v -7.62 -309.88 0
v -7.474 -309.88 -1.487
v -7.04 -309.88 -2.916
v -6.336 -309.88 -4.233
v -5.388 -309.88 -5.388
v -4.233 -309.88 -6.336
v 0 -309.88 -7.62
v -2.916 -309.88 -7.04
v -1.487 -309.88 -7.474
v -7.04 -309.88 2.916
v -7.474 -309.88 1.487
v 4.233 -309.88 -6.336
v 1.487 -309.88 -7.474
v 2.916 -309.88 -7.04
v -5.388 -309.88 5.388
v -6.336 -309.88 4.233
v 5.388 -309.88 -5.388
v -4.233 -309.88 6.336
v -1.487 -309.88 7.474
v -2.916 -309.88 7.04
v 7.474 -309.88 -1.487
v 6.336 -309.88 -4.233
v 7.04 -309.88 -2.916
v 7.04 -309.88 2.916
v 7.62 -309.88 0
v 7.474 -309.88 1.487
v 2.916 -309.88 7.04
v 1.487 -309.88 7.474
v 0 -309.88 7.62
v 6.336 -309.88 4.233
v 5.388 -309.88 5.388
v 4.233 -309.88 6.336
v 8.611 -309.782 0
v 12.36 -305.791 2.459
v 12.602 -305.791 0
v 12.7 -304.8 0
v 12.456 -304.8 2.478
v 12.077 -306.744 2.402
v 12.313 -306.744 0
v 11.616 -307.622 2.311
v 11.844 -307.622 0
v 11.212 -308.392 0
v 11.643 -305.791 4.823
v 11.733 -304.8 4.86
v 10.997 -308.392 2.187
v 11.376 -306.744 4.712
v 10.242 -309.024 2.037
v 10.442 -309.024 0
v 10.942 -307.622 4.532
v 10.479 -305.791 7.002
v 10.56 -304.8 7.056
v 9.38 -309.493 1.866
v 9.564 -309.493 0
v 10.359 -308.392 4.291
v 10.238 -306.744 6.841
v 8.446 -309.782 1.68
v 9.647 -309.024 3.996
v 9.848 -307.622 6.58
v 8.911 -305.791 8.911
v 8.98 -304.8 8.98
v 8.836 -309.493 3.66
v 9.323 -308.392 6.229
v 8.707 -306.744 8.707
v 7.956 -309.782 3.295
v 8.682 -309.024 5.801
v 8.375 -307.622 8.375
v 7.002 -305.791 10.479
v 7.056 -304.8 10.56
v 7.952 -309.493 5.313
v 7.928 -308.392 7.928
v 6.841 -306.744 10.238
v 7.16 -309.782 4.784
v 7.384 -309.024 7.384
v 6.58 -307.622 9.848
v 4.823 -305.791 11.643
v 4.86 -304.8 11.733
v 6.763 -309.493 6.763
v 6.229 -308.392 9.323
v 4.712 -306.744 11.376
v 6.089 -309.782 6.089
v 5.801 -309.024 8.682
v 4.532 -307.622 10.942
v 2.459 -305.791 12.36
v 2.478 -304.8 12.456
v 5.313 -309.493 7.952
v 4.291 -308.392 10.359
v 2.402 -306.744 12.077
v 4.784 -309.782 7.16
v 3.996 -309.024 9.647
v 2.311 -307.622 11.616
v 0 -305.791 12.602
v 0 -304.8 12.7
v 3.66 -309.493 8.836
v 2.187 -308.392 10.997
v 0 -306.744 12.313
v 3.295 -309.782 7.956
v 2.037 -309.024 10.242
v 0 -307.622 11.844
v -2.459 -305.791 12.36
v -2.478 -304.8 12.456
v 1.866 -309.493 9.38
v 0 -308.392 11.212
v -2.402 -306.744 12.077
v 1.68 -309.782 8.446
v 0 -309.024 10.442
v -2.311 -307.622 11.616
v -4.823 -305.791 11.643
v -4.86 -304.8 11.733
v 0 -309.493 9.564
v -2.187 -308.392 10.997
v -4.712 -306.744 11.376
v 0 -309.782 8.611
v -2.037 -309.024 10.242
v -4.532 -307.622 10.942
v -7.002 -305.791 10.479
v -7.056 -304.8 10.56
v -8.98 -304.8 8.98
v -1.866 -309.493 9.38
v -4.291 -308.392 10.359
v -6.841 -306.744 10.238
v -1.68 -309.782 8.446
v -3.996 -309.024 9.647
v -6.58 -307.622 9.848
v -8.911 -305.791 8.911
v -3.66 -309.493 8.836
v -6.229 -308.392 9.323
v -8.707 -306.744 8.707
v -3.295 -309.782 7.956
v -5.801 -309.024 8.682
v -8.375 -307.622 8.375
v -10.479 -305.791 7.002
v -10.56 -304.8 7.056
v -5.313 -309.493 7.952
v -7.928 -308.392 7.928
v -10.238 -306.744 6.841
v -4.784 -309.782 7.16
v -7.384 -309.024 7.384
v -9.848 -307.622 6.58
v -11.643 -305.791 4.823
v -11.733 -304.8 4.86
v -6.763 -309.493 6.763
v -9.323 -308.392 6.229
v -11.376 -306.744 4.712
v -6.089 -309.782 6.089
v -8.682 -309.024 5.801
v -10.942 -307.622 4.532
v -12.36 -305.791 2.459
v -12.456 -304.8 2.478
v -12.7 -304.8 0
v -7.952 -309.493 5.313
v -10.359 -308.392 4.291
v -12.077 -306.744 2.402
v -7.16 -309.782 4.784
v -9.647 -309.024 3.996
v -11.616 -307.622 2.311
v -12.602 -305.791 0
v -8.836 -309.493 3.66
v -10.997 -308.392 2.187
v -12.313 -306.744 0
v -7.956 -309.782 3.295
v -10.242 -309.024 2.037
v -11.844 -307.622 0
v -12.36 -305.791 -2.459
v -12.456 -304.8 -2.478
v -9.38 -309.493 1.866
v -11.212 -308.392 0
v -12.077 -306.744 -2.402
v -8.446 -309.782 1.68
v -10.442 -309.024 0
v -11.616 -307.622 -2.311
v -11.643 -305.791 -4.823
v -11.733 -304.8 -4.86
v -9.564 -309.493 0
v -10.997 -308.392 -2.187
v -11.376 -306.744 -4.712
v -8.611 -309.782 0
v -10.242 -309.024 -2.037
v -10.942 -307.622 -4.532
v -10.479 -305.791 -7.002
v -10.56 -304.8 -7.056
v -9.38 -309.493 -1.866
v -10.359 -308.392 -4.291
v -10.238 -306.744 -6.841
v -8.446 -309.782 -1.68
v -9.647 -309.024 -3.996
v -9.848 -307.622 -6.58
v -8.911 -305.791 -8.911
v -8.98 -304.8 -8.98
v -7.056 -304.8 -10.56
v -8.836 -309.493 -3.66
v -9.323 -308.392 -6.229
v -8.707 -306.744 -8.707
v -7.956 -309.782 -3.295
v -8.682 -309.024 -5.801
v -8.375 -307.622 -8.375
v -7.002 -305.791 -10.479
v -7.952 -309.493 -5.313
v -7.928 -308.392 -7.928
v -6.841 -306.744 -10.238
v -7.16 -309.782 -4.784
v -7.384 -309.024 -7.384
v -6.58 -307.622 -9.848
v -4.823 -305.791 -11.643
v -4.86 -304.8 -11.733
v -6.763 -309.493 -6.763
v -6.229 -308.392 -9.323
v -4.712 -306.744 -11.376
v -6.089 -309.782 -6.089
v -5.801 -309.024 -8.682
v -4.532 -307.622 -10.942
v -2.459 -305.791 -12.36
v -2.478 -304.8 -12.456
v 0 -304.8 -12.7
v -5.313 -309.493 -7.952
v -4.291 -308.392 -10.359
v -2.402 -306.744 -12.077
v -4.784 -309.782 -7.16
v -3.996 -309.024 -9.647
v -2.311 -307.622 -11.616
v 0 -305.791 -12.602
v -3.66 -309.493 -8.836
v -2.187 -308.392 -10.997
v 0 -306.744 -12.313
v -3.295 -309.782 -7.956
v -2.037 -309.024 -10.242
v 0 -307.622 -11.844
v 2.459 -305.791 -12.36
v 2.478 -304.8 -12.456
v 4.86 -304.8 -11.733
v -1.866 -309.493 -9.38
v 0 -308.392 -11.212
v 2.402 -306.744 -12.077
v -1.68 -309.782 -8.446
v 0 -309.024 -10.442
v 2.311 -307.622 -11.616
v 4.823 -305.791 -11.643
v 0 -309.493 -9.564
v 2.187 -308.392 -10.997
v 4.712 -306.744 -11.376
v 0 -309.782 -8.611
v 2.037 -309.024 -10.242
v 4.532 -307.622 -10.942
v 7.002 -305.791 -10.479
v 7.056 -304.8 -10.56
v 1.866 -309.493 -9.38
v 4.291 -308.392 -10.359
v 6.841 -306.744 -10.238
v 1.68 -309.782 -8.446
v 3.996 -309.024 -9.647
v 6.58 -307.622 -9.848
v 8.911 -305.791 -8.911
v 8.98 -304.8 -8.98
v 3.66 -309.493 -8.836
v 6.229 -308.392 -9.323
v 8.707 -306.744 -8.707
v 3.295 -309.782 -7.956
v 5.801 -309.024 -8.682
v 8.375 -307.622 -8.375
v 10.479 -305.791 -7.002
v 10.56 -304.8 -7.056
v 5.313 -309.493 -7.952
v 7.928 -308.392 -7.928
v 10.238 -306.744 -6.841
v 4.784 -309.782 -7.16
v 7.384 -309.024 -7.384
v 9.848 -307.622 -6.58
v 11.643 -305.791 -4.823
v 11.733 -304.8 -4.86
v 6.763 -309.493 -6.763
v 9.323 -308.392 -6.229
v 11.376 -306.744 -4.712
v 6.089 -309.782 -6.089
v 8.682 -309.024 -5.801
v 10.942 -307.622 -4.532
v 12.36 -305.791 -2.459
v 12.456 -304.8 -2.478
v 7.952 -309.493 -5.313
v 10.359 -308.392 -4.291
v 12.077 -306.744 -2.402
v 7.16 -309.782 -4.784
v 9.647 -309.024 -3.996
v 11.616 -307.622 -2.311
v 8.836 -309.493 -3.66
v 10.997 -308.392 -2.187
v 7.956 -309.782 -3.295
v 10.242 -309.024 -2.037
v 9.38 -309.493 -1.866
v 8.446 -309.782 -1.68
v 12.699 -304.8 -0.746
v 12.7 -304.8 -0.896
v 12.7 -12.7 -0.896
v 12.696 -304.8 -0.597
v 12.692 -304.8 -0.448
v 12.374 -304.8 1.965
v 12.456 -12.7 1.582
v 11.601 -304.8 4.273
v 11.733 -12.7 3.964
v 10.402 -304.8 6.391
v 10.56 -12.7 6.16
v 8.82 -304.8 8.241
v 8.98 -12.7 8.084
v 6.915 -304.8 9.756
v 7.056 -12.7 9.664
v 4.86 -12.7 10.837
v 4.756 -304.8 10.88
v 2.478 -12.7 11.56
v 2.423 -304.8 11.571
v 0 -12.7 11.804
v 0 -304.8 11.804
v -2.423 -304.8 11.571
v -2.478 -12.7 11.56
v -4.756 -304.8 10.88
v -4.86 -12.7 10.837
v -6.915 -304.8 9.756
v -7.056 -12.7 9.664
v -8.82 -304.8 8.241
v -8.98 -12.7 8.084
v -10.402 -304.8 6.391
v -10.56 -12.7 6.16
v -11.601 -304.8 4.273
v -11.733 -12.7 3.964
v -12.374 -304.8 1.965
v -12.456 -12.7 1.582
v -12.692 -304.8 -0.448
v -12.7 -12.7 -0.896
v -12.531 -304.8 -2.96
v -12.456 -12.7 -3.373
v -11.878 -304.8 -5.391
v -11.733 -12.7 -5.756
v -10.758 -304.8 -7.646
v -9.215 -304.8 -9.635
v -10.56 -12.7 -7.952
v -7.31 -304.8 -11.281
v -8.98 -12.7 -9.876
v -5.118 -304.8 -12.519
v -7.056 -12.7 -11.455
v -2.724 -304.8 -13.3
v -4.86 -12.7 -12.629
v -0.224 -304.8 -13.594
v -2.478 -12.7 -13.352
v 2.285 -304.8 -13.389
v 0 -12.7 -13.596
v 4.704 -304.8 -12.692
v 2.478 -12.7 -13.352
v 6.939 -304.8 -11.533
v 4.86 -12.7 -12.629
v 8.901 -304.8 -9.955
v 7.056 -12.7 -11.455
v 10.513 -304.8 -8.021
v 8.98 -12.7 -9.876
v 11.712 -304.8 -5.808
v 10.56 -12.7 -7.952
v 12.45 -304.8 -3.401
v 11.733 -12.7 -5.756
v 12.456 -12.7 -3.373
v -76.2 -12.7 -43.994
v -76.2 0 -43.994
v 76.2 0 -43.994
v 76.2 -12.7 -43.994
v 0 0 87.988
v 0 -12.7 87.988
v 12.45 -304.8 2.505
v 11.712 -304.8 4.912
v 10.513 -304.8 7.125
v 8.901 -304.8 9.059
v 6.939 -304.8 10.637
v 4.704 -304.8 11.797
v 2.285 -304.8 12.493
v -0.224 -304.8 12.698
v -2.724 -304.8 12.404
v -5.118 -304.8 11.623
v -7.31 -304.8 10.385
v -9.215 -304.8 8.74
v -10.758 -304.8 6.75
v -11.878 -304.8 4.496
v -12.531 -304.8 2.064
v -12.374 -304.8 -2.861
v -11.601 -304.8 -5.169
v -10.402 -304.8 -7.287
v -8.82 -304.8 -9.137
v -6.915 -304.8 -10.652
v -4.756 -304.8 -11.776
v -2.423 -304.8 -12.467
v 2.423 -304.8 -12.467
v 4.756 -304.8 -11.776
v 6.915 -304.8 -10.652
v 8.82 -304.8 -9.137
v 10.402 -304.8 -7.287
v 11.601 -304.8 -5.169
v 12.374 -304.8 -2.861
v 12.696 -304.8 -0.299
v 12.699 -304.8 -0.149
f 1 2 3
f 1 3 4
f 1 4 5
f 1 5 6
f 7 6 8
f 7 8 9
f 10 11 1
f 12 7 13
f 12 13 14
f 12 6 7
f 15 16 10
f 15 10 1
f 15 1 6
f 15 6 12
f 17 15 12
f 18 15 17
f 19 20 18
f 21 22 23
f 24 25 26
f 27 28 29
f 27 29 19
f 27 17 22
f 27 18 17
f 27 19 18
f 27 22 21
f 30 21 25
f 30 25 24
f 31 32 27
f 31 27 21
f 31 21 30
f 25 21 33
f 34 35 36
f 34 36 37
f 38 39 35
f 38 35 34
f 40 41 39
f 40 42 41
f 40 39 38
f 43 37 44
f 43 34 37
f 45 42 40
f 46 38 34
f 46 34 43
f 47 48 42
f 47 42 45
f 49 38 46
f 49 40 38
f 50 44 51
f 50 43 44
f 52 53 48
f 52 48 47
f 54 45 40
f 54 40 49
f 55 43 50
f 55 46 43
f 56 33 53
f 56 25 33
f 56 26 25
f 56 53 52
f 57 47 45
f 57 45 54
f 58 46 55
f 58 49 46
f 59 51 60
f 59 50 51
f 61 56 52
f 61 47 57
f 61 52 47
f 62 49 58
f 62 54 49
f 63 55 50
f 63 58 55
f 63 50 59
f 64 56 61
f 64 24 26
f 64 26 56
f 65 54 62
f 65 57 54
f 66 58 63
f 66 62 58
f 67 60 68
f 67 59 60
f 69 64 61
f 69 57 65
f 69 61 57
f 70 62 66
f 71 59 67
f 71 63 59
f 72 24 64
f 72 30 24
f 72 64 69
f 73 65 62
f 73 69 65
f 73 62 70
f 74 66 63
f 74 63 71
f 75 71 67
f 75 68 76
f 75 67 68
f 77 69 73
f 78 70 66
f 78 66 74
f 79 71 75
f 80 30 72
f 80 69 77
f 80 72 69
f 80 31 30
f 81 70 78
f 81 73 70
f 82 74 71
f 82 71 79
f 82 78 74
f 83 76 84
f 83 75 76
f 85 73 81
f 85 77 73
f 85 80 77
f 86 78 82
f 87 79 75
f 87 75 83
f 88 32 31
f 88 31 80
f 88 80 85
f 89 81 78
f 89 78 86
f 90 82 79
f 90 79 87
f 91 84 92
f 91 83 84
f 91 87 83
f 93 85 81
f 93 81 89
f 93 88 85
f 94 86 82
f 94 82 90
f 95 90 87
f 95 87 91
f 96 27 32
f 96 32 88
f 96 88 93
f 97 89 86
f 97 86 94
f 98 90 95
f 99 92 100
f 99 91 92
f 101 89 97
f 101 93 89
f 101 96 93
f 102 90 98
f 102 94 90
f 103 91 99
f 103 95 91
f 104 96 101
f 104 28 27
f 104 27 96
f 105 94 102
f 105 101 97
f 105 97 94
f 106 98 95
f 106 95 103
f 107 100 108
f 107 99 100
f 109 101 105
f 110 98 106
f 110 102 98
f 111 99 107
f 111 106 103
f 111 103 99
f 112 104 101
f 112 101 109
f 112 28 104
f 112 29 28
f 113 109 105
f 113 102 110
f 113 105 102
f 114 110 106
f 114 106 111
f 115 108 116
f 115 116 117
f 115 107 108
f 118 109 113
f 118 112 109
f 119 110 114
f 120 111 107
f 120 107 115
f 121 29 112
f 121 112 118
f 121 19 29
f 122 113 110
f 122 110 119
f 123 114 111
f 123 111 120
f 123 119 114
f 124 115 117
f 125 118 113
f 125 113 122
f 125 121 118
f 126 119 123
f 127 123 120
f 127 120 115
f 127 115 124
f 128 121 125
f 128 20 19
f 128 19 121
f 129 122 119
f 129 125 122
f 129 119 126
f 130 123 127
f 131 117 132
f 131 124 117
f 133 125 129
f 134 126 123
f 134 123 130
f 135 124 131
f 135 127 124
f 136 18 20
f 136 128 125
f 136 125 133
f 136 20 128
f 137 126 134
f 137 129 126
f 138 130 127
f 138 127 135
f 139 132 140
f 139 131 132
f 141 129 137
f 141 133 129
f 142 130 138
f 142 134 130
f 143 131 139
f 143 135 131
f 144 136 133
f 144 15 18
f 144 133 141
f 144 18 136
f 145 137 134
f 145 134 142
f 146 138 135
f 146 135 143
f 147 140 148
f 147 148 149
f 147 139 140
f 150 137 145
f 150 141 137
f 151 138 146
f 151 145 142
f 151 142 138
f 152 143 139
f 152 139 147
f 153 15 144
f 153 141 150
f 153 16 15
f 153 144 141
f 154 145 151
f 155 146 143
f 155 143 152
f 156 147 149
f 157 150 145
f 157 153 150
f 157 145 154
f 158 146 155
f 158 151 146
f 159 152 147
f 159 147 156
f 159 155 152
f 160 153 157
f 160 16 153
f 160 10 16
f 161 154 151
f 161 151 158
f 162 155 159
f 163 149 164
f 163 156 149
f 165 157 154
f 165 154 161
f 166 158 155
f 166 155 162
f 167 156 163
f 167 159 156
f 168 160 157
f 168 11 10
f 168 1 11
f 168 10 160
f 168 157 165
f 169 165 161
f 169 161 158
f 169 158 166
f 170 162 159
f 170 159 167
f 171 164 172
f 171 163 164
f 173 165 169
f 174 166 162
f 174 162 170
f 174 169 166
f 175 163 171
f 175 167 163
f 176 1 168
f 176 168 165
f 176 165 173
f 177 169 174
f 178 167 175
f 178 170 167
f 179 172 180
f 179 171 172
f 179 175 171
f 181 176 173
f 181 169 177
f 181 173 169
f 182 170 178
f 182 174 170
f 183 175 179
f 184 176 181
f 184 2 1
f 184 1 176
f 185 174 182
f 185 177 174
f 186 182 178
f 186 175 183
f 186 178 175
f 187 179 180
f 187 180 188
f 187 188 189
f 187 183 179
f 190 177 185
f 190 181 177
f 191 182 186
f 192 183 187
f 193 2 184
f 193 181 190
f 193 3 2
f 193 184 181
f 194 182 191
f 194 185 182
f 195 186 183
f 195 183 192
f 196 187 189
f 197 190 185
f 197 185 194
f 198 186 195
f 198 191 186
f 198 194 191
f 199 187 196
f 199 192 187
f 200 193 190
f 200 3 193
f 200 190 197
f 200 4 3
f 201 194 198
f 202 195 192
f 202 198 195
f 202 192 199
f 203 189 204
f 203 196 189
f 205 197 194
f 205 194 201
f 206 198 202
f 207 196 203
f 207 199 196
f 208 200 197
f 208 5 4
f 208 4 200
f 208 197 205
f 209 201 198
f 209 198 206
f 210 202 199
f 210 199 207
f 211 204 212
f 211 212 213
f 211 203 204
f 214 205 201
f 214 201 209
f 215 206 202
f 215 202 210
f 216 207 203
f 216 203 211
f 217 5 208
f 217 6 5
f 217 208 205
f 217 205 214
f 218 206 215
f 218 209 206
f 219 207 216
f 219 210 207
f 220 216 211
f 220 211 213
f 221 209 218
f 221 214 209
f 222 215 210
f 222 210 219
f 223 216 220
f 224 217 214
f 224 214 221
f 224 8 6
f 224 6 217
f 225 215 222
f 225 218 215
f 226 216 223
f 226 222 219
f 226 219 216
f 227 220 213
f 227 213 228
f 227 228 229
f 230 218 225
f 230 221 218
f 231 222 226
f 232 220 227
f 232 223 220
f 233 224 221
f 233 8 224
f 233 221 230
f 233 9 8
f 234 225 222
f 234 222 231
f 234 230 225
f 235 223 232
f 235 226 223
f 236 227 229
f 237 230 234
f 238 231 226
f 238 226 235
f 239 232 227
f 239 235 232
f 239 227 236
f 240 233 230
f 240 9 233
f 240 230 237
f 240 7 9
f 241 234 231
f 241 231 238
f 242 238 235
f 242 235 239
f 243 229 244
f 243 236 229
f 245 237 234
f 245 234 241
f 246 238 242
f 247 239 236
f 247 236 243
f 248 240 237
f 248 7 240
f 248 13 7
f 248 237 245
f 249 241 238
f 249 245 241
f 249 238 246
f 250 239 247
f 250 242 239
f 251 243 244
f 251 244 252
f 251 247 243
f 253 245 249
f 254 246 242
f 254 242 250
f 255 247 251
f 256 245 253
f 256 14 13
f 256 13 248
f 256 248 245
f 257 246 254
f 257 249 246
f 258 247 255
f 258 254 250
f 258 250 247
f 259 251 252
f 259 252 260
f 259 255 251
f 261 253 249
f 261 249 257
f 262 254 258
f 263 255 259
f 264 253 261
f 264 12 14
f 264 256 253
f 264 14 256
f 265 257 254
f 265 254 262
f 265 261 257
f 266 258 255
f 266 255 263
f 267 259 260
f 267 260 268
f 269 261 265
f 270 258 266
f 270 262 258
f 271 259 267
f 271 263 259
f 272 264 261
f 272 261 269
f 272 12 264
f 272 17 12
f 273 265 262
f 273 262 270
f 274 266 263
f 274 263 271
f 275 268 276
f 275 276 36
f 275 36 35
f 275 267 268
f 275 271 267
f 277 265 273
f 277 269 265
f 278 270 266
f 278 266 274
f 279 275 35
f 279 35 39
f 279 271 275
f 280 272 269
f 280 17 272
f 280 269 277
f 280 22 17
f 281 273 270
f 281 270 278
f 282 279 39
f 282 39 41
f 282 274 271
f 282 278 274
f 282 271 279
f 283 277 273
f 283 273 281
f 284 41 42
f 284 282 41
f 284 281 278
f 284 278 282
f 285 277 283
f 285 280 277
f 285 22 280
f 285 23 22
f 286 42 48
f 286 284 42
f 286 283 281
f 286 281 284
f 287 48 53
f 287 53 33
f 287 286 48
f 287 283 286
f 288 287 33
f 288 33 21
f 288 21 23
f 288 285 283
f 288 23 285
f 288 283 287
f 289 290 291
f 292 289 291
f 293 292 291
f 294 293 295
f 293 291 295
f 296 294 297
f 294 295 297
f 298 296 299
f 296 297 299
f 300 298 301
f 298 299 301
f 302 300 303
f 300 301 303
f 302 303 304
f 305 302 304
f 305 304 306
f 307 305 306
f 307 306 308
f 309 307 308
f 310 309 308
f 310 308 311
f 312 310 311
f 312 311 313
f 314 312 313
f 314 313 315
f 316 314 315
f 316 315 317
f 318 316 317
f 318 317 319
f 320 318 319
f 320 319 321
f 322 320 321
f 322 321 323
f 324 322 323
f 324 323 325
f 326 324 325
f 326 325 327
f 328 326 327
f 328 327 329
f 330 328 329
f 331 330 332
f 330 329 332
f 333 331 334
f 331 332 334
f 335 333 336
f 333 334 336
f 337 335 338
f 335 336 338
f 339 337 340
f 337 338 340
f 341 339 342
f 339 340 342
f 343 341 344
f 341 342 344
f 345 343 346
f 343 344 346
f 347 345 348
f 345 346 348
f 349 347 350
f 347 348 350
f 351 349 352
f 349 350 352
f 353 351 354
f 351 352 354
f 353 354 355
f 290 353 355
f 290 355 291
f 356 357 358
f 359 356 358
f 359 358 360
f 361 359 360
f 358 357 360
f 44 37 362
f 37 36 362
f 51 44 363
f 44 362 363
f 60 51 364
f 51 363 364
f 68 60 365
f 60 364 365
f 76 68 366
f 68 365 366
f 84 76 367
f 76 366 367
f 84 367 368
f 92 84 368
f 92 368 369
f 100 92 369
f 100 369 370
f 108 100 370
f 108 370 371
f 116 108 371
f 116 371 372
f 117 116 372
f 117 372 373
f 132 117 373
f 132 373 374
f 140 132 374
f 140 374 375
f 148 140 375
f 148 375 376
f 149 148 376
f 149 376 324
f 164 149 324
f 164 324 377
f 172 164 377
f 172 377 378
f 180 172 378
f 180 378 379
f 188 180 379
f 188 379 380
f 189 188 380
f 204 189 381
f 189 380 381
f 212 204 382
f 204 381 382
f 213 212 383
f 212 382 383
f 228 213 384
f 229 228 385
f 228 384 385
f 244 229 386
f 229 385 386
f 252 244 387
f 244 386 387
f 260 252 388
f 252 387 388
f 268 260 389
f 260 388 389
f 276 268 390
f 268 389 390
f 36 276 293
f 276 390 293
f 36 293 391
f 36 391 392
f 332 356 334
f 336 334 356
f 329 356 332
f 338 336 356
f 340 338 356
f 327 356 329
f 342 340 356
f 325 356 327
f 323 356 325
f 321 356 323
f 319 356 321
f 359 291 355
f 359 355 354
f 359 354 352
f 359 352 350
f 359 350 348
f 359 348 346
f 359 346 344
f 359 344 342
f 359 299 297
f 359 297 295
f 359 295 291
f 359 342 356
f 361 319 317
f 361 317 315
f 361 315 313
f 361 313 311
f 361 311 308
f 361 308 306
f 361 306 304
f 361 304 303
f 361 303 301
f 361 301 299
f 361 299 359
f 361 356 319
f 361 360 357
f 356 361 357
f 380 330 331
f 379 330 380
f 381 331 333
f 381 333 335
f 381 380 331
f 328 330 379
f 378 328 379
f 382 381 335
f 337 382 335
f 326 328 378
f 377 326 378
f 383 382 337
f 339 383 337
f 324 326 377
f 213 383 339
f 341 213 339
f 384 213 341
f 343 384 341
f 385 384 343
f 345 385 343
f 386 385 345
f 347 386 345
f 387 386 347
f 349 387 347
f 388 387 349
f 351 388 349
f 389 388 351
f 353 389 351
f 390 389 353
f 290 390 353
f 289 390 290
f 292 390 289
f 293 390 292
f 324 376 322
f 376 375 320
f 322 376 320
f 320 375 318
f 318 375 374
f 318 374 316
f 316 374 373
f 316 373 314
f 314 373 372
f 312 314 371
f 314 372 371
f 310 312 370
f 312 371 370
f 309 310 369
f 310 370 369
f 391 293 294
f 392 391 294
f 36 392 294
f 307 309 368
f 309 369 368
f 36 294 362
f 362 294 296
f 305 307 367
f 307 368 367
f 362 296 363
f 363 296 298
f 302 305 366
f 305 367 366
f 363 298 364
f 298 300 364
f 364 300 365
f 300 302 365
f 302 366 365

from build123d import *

# Parameters (mm, degrees)
F1_DEPTH = 12.7
F2_R     = 12.7
F3_DEPTH = 304.8
F4_R     = 12.7
F5_DEPTH = 5.08
F6_R     = 5.07999


# Not quite as in the source:
# - a fillet or chamfer is up to 0.001 mm smaller than in the source, because OpenCascade refuses the exact size


with BuildPart() as f1:
    # F0 (on Front) → F1 (new body)
    with BuildSketch(Plane.XZ):
        Polygon((-76.2, -43.9940905122), (76.2, -43.9940905122), (0, 87.9881810245), align=None)
    extrude(amount=F1_DEPTH)

    # F2 (on Front) → F3 (join)
    with BuildSketch(Plane.XZ):
        with Locations((0, -0.8957827414)):
            Circle(F2_R)
    extrude(amount=F3_DEPTH)

    # F4 (on face) → F5 (join)
    with BuildSketch(Plane.XZ.offset(304.8)):
        Circle(F4_R)
    extrude(amount=F5_DEPTH)

    # F6 (radius 5.08 in the source; OpenCascade refuses exactly that, so slightly less here)
    f6_edges = [f1.edges().sort_by_distance(p)[0] for p in [
        (-12.7, -309.88, 0),
    ]]
    fillet(f6_edges, radius=F6_R)


solid = f1.part
